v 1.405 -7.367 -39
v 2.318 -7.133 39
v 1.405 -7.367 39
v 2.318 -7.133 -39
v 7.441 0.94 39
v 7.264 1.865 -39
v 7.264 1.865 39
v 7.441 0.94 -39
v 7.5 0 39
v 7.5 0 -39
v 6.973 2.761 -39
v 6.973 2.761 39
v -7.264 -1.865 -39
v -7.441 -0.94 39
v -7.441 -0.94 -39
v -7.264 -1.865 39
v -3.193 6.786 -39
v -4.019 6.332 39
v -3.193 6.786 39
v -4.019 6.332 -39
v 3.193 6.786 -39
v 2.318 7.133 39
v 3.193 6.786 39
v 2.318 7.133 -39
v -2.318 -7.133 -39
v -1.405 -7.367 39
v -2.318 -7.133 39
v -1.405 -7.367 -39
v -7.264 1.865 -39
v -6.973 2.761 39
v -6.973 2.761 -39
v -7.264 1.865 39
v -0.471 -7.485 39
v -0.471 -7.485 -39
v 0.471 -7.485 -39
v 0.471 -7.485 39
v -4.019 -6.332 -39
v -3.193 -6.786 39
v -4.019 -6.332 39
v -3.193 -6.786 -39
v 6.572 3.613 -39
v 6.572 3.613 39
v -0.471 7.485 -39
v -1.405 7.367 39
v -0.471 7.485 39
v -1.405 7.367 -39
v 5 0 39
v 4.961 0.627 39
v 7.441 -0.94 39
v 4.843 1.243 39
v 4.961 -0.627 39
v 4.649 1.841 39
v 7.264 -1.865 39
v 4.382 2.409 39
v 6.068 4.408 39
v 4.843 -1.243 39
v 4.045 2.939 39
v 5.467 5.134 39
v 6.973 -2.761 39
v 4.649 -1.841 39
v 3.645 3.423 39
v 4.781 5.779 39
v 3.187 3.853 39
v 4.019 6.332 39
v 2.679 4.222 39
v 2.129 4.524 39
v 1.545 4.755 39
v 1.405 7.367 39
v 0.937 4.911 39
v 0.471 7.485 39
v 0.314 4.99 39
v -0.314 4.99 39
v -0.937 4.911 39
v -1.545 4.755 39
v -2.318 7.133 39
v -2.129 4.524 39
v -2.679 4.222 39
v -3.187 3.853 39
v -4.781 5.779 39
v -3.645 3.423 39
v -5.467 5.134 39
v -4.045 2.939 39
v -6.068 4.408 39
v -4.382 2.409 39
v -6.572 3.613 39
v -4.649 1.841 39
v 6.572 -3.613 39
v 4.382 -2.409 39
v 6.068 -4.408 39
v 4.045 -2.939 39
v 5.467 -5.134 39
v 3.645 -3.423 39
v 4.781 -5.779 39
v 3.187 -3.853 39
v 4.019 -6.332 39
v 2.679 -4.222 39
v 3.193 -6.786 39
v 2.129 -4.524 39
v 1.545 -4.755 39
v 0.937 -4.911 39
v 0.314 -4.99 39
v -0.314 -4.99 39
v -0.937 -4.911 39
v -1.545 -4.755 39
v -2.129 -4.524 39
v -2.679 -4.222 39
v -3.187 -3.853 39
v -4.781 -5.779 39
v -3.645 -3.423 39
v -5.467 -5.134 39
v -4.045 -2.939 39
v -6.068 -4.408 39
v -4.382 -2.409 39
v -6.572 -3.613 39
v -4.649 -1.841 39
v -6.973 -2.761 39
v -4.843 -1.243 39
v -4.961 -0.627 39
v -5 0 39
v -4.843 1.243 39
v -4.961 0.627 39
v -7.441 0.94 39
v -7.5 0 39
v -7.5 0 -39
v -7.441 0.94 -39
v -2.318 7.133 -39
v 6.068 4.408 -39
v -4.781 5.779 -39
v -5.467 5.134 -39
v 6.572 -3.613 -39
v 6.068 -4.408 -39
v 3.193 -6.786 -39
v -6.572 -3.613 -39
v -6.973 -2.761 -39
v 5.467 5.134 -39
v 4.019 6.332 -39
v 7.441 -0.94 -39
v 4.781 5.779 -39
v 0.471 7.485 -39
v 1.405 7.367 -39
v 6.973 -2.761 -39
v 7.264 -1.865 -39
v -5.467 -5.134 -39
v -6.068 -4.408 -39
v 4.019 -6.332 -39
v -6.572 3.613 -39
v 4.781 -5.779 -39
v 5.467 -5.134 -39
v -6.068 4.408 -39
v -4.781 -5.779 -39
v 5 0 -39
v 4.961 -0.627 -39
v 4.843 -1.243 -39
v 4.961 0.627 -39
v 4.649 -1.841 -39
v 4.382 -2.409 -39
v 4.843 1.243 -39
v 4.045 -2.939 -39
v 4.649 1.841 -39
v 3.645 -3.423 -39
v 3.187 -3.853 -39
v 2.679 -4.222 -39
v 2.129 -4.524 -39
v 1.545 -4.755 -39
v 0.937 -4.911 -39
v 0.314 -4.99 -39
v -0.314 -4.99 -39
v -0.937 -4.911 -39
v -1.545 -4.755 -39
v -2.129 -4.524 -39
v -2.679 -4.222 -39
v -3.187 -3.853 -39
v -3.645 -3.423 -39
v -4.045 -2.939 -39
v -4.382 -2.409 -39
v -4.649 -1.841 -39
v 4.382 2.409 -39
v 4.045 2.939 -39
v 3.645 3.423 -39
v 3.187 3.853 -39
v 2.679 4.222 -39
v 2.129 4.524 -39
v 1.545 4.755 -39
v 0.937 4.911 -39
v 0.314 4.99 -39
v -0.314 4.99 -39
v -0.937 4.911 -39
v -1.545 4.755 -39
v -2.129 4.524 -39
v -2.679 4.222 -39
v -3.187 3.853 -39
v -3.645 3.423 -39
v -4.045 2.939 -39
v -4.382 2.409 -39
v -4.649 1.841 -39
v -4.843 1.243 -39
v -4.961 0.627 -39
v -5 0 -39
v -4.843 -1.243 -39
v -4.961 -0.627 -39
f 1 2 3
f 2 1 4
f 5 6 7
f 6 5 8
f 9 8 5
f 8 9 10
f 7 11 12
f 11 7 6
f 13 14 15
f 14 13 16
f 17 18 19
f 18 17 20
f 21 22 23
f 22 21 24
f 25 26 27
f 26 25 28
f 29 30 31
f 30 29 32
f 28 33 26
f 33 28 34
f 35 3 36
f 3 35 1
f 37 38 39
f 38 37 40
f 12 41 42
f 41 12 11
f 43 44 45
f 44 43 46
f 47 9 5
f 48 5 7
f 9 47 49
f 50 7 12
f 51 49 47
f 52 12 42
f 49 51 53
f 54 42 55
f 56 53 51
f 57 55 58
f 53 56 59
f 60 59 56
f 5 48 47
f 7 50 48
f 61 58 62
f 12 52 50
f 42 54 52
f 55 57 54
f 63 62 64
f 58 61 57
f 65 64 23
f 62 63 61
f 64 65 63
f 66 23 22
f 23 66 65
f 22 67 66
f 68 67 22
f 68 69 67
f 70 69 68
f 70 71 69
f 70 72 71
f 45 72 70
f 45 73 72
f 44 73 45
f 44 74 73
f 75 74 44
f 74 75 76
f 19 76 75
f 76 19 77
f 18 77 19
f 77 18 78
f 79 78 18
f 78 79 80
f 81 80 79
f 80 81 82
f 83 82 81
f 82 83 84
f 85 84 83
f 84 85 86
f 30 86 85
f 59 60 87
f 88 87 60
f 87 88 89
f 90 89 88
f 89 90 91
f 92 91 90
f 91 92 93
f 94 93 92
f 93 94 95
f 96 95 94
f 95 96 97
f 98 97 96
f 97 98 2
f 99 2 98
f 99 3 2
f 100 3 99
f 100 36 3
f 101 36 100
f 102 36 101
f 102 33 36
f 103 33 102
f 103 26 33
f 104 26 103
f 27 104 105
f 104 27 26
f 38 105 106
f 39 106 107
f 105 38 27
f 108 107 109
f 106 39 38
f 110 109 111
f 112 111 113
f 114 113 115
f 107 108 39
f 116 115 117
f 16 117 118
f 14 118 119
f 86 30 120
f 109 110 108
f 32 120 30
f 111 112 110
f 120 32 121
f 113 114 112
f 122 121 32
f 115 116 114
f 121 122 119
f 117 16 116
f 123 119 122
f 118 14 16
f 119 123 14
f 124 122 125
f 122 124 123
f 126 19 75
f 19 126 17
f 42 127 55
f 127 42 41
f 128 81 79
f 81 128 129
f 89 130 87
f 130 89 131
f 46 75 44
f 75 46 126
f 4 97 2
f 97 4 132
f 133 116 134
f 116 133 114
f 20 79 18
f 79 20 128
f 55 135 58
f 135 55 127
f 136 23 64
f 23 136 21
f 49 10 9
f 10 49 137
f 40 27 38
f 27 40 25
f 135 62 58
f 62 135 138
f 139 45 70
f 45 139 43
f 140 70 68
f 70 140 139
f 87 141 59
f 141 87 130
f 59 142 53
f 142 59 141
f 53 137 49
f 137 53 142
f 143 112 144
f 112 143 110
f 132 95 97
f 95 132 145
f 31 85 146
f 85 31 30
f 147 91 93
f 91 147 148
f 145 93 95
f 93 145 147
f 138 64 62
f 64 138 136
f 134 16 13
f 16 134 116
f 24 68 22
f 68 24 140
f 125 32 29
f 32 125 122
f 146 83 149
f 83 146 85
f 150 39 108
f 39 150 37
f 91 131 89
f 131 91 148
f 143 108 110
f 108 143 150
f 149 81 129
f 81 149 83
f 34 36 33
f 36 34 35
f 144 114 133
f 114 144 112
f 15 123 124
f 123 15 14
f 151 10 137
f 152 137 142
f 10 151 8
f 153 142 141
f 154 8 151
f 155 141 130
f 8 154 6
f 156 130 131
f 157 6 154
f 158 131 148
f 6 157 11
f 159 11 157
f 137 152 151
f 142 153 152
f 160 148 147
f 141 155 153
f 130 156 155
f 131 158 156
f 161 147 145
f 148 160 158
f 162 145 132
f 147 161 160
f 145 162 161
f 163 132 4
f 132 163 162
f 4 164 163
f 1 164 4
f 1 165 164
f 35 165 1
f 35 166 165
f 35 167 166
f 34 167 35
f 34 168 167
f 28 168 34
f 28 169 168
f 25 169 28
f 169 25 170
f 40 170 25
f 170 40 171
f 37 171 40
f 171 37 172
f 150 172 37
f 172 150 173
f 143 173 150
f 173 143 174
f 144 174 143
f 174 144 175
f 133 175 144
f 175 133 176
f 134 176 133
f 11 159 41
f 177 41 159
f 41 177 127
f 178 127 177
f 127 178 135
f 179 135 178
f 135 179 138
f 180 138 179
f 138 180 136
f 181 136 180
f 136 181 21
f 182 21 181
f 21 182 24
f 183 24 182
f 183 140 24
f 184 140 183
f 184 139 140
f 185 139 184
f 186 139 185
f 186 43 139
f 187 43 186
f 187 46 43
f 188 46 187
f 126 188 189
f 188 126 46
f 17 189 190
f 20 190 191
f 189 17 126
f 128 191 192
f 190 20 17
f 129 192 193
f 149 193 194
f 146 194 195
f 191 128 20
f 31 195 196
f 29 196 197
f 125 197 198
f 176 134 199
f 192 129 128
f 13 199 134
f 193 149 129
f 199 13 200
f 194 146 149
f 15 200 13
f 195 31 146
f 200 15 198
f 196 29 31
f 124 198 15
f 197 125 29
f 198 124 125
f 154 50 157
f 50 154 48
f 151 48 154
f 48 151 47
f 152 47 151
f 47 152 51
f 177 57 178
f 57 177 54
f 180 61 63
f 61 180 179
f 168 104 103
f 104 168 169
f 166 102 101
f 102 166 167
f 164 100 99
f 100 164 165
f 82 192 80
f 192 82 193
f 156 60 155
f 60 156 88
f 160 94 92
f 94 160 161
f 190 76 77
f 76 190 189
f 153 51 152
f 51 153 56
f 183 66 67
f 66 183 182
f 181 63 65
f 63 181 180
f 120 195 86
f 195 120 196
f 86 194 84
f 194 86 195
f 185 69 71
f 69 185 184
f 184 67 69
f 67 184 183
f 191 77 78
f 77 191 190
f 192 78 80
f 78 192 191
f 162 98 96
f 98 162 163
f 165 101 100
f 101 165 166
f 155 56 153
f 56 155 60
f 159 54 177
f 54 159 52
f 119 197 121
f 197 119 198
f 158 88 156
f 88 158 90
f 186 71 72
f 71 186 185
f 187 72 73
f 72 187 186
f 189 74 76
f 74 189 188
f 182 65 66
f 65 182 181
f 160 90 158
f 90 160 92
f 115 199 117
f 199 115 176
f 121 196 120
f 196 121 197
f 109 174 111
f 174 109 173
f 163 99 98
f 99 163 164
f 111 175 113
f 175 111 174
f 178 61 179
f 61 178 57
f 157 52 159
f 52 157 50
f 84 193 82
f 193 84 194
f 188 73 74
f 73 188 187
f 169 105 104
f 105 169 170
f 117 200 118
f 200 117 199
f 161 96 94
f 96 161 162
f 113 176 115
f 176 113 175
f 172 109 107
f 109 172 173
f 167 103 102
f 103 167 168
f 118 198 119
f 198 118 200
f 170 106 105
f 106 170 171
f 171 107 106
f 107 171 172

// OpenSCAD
$fn = 50;


difference() {
	union() {
		translate(v = [0, 0, -39.0000000000]) {
			cylinder(h = 78, r = 7.5000000000);
		}
	}
	union() {
		translate(v = [0, 0, -100.0000000000]) {
			cylinder(h = 200, r = 5.0000000000);
		}
	}
}
